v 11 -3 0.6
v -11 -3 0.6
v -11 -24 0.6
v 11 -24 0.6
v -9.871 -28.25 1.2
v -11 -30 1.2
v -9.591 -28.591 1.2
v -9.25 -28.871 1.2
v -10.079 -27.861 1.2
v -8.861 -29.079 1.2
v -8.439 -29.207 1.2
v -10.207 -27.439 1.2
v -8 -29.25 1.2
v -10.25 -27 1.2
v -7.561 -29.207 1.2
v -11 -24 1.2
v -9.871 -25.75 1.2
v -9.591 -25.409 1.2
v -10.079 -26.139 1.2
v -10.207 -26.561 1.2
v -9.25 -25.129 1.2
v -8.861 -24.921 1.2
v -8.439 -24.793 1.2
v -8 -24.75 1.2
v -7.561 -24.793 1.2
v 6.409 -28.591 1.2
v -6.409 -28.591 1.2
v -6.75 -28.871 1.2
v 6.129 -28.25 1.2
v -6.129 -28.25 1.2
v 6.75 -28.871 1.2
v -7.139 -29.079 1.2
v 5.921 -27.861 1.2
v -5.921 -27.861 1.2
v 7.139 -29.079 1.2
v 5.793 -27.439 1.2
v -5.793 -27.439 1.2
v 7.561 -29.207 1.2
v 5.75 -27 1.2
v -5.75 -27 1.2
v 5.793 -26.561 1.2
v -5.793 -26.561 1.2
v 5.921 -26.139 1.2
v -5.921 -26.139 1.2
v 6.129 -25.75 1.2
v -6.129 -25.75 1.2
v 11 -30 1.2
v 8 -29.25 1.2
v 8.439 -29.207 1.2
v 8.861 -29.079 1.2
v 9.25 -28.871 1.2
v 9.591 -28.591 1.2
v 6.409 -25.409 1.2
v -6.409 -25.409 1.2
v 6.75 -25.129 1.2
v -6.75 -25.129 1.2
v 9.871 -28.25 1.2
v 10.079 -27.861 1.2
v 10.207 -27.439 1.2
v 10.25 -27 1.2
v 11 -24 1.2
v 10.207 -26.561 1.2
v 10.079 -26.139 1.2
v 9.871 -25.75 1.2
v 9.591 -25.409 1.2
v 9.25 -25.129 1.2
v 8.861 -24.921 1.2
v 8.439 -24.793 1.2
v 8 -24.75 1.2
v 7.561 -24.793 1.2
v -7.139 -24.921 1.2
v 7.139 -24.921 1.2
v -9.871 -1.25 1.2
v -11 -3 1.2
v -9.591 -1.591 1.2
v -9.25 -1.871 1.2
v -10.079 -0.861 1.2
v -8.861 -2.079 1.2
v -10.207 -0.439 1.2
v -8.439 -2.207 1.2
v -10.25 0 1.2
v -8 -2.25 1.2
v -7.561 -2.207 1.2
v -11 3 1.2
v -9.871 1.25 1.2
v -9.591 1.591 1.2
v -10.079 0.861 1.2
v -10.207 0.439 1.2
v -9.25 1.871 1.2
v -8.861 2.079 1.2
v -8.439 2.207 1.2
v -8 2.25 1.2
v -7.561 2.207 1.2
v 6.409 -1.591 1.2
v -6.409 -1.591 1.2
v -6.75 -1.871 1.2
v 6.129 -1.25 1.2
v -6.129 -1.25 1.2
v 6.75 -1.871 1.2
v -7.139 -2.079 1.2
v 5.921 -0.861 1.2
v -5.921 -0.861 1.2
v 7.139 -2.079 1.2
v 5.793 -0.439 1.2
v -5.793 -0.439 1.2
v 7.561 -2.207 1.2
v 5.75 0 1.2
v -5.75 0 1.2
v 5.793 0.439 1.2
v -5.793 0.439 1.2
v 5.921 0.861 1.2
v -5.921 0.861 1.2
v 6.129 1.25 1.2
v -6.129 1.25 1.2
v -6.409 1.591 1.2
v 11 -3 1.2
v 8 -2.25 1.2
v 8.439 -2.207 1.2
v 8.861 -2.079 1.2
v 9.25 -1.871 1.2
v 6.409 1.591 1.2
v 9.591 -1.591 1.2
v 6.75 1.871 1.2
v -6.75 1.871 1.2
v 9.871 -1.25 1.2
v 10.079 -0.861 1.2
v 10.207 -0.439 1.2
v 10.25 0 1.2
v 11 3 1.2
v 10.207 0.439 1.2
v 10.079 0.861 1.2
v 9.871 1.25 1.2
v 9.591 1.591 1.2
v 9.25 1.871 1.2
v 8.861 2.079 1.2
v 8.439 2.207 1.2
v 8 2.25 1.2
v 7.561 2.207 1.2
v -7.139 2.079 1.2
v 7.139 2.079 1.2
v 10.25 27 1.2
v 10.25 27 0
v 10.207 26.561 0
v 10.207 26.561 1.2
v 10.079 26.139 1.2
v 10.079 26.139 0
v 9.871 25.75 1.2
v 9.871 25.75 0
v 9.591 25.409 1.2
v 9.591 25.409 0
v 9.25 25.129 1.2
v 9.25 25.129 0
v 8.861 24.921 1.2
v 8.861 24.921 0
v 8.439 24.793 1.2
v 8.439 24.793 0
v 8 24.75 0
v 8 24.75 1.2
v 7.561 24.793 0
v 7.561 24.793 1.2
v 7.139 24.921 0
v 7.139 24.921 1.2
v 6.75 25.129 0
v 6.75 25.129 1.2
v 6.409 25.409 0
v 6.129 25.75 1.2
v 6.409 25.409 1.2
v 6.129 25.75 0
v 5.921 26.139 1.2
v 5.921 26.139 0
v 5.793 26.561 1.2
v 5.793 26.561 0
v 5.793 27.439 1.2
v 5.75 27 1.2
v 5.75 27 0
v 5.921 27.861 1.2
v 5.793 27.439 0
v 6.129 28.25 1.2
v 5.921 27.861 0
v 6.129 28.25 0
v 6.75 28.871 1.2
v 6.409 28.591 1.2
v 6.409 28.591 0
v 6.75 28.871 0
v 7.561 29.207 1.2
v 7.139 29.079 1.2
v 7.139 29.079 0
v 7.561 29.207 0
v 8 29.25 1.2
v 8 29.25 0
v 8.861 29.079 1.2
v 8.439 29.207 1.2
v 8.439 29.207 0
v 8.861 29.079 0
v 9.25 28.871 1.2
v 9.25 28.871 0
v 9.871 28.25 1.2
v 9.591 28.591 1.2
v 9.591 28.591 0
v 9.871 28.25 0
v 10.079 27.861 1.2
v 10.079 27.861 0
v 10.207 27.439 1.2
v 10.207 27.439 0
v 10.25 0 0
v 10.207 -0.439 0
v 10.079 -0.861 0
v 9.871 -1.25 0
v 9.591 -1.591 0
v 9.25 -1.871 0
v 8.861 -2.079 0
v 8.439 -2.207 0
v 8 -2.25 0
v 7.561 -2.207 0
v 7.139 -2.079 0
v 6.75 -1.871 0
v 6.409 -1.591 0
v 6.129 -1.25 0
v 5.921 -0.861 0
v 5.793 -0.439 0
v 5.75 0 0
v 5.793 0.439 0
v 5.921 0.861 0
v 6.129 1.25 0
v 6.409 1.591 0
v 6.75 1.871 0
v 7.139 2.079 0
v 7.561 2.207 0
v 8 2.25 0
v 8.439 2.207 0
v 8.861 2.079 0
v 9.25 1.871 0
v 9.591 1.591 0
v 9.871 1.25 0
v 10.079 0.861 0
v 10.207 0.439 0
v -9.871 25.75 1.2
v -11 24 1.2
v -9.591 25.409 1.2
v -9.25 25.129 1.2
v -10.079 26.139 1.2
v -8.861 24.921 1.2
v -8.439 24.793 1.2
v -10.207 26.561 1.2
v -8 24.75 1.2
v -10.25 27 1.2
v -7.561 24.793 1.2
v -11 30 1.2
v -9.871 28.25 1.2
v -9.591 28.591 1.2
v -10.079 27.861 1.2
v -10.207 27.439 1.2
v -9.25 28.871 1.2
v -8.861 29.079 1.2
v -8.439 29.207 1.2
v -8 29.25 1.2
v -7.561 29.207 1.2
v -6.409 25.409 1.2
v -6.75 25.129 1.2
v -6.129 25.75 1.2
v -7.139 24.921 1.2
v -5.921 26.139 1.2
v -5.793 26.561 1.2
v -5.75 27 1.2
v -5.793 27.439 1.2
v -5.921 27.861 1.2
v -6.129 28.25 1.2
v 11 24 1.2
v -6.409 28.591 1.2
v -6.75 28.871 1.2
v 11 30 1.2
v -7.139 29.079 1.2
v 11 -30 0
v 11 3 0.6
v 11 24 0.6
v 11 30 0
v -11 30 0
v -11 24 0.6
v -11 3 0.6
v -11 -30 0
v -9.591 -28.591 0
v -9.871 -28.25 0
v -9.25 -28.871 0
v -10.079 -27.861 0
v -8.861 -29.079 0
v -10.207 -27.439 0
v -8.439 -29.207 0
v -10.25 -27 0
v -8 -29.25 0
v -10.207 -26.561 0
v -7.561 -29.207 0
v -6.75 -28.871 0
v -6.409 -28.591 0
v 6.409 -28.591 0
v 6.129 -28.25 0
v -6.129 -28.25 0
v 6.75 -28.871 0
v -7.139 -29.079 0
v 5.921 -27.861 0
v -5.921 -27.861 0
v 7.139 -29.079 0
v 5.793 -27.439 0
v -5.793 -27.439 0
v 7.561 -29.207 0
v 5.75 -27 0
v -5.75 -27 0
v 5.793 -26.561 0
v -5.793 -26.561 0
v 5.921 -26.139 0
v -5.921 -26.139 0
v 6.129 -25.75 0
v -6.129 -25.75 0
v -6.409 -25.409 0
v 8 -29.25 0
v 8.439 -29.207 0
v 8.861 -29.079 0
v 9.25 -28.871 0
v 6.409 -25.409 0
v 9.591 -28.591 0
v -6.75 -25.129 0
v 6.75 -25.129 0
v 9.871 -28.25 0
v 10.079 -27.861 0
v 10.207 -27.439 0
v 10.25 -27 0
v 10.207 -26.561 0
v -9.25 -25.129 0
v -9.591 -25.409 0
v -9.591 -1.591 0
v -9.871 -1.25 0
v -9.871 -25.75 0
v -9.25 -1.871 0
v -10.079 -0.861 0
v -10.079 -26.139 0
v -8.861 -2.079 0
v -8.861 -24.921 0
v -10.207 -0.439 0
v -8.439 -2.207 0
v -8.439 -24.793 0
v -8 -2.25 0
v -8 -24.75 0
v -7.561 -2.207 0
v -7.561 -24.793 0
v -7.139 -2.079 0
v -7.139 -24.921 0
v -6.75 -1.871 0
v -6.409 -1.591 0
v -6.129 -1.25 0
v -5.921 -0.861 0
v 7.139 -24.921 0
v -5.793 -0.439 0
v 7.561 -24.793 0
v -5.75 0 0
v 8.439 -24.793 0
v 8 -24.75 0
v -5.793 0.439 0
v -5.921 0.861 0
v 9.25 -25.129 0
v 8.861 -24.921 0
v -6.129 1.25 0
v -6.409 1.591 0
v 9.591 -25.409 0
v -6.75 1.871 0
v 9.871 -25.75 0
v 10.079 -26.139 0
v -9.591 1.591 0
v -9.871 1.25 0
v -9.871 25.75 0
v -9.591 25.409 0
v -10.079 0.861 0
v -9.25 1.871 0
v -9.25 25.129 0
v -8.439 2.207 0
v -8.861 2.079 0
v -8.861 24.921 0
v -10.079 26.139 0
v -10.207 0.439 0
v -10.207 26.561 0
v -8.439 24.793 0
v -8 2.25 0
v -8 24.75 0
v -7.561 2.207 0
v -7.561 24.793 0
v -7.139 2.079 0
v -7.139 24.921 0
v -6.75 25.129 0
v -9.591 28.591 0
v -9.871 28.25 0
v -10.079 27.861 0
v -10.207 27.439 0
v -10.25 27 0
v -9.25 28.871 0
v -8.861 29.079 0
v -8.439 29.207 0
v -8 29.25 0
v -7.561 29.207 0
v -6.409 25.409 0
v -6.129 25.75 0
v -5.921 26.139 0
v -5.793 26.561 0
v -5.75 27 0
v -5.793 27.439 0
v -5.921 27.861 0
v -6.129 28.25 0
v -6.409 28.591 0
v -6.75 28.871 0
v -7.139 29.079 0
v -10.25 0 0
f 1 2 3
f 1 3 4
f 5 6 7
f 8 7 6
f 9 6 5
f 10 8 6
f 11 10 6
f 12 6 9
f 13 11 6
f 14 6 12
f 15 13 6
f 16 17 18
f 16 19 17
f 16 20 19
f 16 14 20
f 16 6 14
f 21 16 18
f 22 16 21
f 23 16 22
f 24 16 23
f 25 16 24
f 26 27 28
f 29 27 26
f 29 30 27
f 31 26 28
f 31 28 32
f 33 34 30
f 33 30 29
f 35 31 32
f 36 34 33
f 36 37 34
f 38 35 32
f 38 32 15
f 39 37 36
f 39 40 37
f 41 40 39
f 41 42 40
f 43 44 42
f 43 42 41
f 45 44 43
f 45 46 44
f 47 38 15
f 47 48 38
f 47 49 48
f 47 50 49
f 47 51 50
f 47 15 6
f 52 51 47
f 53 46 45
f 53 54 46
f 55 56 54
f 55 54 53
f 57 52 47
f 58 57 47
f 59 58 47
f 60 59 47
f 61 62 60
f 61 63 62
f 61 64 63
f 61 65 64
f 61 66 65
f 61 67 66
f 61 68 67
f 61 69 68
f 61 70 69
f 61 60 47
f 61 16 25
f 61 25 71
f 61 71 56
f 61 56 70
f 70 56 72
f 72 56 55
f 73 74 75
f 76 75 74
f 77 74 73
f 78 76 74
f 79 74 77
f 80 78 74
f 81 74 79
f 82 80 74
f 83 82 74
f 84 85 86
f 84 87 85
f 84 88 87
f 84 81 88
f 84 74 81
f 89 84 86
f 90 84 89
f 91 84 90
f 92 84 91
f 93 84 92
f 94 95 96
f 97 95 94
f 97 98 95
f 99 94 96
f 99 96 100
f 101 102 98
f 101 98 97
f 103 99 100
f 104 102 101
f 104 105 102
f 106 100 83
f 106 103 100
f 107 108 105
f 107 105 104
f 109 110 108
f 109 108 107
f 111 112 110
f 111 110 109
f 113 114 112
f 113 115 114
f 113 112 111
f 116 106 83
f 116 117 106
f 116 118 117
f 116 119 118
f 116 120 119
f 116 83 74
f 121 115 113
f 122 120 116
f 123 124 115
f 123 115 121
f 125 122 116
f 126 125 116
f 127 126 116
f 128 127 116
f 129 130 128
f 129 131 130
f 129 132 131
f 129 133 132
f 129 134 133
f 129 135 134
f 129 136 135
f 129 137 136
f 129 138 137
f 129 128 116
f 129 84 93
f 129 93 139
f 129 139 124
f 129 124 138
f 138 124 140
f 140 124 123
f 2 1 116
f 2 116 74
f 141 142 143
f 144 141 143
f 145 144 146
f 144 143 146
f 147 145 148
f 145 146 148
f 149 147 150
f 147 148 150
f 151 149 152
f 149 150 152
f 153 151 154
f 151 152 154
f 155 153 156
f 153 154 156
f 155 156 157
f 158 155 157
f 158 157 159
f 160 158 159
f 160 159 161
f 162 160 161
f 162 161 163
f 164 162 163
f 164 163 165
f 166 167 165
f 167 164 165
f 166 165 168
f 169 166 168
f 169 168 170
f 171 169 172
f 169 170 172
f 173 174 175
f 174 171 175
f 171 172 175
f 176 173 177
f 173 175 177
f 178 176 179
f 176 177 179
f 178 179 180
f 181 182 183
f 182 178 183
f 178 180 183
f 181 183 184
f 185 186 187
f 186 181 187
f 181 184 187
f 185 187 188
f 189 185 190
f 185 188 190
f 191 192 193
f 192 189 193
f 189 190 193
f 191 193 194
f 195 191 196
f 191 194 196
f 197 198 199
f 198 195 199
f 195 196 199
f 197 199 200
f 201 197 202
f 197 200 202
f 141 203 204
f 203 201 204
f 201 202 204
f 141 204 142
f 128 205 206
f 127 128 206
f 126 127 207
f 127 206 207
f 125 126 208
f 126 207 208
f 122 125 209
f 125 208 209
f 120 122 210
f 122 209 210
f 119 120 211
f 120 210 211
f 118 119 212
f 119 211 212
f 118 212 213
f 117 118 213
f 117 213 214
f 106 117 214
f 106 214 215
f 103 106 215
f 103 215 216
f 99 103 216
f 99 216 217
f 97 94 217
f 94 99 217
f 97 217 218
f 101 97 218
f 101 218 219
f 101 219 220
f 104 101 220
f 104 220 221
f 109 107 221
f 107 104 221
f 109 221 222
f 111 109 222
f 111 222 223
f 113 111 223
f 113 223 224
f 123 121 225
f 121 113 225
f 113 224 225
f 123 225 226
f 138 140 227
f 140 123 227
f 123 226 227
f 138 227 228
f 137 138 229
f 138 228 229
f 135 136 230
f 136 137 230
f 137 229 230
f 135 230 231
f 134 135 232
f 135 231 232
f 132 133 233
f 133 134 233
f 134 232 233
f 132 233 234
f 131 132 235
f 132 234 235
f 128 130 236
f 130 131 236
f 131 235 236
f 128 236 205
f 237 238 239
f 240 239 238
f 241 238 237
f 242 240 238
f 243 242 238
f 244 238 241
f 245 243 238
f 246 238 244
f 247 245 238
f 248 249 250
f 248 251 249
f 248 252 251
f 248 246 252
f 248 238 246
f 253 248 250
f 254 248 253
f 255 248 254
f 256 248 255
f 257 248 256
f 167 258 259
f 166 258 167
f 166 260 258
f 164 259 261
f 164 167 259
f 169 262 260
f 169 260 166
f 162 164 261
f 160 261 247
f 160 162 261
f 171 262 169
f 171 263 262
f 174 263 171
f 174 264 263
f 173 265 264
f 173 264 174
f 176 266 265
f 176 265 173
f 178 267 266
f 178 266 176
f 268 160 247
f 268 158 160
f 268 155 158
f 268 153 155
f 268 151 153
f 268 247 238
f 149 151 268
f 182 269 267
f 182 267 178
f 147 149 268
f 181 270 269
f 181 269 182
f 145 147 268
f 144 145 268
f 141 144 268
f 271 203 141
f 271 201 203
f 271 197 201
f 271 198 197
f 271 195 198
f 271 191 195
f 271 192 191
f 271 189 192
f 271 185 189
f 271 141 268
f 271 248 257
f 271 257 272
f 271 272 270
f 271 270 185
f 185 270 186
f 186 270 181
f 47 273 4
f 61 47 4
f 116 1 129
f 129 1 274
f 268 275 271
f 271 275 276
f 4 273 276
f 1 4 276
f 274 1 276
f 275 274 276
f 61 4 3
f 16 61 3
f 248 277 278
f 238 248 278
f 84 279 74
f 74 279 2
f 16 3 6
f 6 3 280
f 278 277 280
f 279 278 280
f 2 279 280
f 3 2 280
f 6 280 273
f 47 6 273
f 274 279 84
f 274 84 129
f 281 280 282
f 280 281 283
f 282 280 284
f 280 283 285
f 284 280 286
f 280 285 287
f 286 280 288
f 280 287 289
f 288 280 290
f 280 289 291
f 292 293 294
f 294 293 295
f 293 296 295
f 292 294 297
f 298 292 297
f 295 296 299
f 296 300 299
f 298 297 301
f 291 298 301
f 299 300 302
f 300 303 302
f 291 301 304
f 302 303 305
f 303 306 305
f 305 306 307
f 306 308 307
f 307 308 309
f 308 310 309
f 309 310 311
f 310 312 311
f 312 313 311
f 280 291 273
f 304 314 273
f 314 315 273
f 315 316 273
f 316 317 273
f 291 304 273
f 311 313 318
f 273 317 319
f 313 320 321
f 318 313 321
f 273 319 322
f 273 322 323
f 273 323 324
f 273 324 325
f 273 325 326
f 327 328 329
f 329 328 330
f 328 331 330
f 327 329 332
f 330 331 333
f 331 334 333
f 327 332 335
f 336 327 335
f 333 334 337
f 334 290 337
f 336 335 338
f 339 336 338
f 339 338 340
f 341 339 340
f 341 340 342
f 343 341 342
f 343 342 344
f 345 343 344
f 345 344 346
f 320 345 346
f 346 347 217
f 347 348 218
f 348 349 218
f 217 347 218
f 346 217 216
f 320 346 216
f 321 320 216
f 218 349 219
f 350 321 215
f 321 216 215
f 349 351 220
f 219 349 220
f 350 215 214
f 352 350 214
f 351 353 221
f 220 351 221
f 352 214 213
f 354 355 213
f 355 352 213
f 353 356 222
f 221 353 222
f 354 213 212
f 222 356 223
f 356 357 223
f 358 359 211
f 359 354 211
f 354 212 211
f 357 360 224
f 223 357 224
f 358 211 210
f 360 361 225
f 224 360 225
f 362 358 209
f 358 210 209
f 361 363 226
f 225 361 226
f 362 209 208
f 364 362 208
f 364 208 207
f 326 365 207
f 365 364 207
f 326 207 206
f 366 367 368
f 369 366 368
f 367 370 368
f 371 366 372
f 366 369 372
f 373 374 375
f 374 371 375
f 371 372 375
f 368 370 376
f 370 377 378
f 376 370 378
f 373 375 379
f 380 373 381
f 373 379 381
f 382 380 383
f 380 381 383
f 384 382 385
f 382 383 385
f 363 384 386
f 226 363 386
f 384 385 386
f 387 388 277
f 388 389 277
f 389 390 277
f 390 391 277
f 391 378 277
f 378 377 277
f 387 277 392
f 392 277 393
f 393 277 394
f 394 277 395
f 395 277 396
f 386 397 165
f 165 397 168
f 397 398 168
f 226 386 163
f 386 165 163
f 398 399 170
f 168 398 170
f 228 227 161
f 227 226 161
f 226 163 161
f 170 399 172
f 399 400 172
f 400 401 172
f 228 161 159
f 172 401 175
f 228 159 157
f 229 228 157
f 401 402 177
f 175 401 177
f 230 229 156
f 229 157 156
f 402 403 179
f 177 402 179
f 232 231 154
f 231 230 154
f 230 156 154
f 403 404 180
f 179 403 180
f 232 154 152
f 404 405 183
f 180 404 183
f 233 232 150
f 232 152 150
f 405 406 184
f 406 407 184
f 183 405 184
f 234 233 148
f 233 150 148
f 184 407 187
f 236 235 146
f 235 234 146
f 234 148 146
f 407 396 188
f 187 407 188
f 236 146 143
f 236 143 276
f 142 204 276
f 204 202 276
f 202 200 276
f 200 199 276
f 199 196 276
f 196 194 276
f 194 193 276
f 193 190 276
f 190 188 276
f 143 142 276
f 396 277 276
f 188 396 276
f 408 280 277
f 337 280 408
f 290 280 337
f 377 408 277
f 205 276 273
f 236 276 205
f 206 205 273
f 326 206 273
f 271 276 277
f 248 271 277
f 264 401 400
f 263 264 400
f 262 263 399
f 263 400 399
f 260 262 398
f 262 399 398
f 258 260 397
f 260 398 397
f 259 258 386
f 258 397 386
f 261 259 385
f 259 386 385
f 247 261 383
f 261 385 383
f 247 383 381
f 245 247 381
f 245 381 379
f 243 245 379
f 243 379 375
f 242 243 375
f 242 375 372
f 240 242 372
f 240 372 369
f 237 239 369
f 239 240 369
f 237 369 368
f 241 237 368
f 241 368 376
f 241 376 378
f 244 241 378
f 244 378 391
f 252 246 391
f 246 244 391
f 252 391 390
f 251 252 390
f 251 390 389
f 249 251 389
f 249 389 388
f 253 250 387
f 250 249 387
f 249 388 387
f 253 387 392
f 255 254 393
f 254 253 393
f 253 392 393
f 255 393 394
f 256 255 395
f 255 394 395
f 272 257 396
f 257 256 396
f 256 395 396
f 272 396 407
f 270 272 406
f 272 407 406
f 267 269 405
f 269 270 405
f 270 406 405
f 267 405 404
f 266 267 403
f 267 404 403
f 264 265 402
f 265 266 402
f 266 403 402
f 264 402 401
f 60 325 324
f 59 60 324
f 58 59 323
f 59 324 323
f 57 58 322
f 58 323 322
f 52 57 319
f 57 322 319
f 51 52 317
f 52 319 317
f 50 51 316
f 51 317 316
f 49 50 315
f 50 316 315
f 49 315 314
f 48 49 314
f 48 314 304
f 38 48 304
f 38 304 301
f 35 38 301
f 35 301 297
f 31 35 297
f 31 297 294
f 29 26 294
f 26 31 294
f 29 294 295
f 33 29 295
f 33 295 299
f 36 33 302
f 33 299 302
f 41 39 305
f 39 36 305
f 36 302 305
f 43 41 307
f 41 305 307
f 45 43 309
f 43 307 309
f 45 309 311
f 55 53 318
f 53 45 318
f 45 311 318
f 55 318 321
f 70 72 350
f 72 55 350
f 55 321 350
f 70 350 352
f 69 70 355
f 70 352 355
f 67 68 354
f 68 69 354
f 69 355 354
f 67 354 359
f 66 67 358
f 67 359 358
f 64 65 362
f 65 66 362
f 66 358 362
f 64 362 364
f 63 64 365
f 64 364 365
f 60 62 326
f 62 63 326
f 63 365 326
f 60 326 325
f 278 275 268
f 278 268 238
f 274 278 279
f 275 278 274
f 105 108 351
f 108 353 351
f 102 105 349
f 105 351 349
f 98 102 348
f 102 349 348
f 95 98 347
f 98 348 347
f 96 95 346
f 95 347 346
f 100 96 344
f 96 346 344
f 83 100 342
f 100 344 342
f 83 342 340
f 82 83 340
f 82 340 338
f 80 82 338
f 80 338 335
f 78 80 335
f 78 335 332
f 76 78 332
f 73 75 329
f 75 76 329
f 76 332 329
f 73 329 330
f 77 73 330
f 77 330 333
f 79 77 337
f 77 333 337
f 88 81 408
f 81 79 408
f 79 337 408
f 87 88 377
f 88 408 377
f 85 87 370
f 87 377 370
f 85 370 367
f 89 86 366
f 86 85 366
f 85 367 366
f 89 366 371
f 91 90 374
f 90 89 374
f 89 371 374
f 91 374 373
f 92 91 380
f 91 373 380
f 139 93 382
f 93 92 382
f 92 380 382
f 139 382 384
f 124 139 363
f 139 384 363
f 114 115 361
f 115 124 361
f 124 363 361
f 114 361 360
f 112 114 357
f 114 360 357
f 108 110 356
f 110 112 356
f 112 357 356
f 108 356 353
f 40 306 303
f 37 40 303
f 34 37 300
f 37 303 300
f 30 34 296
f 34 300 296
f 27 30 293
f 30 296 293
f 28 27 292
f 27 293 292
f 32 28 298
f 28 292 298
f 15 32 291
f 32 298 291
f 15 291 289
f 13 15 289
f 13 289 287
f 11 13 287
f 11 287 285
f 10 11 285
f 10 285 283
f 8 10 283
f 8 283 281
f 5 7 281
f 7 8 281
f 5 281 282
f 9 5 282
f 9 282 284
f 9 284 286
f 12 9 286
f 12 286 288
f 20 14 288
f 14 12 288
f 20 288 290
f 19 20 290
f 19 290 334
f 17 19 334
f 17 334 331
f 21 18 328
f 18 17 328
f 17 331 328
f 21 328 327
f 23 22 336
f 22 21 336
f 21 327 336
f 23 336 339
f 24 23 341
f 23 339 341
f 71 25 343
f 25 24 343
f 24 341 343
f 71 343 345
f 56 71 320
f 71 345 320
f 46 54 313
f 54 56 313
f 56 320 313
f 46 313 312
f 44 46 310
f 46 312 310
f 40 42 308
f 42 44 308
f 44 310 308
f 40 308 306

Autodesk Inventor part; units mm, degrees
ref_plane "YZ Plane" through (0, 0, 0) normal (1, 0, 0) x (0, 1, 0)
ref_plane "XZ Plane" through (0, 0, 0) normal (0, 1, 0) x (-1, 0, 0)
ref_plane "XY Plane" through (0, 0, 0) normal (0, 0, 1) x (1, 0, 0)
sketch "Sketch1" plane through (0, 0, 0) normal (0, 0, 1) x (1, 0, 0)
  line L0 (-11, -30) -> (11, -30)
  line L1 (11, -30) -> (11, 30)
  line L2 (11, 30) -> (-11, 30)
  line L3 (-11, 30) -> (-11, -30)
  circle A0 centre (-8, 0) radius 2.25
  line L4 (-5, 30) -> (-5, -30) construction
  line L5 (5, 30) -> (5, -30) construction
  line L6 (0, 30) -> (0, -30) construction
  circle A1 centre (-8, 27) radius 2.25
  circle A2 centre (-8, -27) radius 2.25
  circle A3 centre (8, -27) radius 2.25
  circle A4 centre (8, 0) radius 2.25
  circle A5 centre (8, 27) radius 2.25
  line L7 (-11, 0) -> (11, 0) construction
  line L8 (-11, 30) -> (11, 30)
  line L9 (11, 30) -> (11, 24)
  line L10 (11, 24) -> (-11, 24)
  line L11 (-11, 24) -> (-11, 30)
  line L12 (-11, 3) -> (11, 3)
  line L13 (11, 3) -> (11, -3)
  line L14 (11, -3) -> (-11, -3)
  line L15 (-11, -3) -> (-11, 3)
  line L16 (-11, -30) -> (11, -30)
  line L17 (11, -30) -> (11, -24)
  line L18 (11, -24) -> (-11, -24)
  line L19 (-11, -24) -> (-11, -30)
  point P0 (0, 0)
  dimension "d0" = 4.5
  dimension "d1" = 3
  dimension "d2" = 3
  dimension "d3" = 10
  dimension "d4" = 60
  dimension "d5" = 4.5
  dimension "d6" = 3
  dimension "d7" = 3
  dimension "d8" = 4.5
  dimension "d9" = 3
  dimension "d10" = 3
  dimension "d11" = 3
  dimension "d14" = 58.5
  dimension "d15" = 3
  dimension "d16" = 3
  dimension "d17" = 3
  dimension "d18" = 3
extrude "Extrusion1" add sketch "Sketch1" along normal blind 0.6
extrude "Extrusion2" add sketch "Sketch1" along normal blind 1.2 contours L3 L18 L1 L0 | L3 L12 L1 L14 | L3 L2 L1 L10
properties part number "FoldLink"
